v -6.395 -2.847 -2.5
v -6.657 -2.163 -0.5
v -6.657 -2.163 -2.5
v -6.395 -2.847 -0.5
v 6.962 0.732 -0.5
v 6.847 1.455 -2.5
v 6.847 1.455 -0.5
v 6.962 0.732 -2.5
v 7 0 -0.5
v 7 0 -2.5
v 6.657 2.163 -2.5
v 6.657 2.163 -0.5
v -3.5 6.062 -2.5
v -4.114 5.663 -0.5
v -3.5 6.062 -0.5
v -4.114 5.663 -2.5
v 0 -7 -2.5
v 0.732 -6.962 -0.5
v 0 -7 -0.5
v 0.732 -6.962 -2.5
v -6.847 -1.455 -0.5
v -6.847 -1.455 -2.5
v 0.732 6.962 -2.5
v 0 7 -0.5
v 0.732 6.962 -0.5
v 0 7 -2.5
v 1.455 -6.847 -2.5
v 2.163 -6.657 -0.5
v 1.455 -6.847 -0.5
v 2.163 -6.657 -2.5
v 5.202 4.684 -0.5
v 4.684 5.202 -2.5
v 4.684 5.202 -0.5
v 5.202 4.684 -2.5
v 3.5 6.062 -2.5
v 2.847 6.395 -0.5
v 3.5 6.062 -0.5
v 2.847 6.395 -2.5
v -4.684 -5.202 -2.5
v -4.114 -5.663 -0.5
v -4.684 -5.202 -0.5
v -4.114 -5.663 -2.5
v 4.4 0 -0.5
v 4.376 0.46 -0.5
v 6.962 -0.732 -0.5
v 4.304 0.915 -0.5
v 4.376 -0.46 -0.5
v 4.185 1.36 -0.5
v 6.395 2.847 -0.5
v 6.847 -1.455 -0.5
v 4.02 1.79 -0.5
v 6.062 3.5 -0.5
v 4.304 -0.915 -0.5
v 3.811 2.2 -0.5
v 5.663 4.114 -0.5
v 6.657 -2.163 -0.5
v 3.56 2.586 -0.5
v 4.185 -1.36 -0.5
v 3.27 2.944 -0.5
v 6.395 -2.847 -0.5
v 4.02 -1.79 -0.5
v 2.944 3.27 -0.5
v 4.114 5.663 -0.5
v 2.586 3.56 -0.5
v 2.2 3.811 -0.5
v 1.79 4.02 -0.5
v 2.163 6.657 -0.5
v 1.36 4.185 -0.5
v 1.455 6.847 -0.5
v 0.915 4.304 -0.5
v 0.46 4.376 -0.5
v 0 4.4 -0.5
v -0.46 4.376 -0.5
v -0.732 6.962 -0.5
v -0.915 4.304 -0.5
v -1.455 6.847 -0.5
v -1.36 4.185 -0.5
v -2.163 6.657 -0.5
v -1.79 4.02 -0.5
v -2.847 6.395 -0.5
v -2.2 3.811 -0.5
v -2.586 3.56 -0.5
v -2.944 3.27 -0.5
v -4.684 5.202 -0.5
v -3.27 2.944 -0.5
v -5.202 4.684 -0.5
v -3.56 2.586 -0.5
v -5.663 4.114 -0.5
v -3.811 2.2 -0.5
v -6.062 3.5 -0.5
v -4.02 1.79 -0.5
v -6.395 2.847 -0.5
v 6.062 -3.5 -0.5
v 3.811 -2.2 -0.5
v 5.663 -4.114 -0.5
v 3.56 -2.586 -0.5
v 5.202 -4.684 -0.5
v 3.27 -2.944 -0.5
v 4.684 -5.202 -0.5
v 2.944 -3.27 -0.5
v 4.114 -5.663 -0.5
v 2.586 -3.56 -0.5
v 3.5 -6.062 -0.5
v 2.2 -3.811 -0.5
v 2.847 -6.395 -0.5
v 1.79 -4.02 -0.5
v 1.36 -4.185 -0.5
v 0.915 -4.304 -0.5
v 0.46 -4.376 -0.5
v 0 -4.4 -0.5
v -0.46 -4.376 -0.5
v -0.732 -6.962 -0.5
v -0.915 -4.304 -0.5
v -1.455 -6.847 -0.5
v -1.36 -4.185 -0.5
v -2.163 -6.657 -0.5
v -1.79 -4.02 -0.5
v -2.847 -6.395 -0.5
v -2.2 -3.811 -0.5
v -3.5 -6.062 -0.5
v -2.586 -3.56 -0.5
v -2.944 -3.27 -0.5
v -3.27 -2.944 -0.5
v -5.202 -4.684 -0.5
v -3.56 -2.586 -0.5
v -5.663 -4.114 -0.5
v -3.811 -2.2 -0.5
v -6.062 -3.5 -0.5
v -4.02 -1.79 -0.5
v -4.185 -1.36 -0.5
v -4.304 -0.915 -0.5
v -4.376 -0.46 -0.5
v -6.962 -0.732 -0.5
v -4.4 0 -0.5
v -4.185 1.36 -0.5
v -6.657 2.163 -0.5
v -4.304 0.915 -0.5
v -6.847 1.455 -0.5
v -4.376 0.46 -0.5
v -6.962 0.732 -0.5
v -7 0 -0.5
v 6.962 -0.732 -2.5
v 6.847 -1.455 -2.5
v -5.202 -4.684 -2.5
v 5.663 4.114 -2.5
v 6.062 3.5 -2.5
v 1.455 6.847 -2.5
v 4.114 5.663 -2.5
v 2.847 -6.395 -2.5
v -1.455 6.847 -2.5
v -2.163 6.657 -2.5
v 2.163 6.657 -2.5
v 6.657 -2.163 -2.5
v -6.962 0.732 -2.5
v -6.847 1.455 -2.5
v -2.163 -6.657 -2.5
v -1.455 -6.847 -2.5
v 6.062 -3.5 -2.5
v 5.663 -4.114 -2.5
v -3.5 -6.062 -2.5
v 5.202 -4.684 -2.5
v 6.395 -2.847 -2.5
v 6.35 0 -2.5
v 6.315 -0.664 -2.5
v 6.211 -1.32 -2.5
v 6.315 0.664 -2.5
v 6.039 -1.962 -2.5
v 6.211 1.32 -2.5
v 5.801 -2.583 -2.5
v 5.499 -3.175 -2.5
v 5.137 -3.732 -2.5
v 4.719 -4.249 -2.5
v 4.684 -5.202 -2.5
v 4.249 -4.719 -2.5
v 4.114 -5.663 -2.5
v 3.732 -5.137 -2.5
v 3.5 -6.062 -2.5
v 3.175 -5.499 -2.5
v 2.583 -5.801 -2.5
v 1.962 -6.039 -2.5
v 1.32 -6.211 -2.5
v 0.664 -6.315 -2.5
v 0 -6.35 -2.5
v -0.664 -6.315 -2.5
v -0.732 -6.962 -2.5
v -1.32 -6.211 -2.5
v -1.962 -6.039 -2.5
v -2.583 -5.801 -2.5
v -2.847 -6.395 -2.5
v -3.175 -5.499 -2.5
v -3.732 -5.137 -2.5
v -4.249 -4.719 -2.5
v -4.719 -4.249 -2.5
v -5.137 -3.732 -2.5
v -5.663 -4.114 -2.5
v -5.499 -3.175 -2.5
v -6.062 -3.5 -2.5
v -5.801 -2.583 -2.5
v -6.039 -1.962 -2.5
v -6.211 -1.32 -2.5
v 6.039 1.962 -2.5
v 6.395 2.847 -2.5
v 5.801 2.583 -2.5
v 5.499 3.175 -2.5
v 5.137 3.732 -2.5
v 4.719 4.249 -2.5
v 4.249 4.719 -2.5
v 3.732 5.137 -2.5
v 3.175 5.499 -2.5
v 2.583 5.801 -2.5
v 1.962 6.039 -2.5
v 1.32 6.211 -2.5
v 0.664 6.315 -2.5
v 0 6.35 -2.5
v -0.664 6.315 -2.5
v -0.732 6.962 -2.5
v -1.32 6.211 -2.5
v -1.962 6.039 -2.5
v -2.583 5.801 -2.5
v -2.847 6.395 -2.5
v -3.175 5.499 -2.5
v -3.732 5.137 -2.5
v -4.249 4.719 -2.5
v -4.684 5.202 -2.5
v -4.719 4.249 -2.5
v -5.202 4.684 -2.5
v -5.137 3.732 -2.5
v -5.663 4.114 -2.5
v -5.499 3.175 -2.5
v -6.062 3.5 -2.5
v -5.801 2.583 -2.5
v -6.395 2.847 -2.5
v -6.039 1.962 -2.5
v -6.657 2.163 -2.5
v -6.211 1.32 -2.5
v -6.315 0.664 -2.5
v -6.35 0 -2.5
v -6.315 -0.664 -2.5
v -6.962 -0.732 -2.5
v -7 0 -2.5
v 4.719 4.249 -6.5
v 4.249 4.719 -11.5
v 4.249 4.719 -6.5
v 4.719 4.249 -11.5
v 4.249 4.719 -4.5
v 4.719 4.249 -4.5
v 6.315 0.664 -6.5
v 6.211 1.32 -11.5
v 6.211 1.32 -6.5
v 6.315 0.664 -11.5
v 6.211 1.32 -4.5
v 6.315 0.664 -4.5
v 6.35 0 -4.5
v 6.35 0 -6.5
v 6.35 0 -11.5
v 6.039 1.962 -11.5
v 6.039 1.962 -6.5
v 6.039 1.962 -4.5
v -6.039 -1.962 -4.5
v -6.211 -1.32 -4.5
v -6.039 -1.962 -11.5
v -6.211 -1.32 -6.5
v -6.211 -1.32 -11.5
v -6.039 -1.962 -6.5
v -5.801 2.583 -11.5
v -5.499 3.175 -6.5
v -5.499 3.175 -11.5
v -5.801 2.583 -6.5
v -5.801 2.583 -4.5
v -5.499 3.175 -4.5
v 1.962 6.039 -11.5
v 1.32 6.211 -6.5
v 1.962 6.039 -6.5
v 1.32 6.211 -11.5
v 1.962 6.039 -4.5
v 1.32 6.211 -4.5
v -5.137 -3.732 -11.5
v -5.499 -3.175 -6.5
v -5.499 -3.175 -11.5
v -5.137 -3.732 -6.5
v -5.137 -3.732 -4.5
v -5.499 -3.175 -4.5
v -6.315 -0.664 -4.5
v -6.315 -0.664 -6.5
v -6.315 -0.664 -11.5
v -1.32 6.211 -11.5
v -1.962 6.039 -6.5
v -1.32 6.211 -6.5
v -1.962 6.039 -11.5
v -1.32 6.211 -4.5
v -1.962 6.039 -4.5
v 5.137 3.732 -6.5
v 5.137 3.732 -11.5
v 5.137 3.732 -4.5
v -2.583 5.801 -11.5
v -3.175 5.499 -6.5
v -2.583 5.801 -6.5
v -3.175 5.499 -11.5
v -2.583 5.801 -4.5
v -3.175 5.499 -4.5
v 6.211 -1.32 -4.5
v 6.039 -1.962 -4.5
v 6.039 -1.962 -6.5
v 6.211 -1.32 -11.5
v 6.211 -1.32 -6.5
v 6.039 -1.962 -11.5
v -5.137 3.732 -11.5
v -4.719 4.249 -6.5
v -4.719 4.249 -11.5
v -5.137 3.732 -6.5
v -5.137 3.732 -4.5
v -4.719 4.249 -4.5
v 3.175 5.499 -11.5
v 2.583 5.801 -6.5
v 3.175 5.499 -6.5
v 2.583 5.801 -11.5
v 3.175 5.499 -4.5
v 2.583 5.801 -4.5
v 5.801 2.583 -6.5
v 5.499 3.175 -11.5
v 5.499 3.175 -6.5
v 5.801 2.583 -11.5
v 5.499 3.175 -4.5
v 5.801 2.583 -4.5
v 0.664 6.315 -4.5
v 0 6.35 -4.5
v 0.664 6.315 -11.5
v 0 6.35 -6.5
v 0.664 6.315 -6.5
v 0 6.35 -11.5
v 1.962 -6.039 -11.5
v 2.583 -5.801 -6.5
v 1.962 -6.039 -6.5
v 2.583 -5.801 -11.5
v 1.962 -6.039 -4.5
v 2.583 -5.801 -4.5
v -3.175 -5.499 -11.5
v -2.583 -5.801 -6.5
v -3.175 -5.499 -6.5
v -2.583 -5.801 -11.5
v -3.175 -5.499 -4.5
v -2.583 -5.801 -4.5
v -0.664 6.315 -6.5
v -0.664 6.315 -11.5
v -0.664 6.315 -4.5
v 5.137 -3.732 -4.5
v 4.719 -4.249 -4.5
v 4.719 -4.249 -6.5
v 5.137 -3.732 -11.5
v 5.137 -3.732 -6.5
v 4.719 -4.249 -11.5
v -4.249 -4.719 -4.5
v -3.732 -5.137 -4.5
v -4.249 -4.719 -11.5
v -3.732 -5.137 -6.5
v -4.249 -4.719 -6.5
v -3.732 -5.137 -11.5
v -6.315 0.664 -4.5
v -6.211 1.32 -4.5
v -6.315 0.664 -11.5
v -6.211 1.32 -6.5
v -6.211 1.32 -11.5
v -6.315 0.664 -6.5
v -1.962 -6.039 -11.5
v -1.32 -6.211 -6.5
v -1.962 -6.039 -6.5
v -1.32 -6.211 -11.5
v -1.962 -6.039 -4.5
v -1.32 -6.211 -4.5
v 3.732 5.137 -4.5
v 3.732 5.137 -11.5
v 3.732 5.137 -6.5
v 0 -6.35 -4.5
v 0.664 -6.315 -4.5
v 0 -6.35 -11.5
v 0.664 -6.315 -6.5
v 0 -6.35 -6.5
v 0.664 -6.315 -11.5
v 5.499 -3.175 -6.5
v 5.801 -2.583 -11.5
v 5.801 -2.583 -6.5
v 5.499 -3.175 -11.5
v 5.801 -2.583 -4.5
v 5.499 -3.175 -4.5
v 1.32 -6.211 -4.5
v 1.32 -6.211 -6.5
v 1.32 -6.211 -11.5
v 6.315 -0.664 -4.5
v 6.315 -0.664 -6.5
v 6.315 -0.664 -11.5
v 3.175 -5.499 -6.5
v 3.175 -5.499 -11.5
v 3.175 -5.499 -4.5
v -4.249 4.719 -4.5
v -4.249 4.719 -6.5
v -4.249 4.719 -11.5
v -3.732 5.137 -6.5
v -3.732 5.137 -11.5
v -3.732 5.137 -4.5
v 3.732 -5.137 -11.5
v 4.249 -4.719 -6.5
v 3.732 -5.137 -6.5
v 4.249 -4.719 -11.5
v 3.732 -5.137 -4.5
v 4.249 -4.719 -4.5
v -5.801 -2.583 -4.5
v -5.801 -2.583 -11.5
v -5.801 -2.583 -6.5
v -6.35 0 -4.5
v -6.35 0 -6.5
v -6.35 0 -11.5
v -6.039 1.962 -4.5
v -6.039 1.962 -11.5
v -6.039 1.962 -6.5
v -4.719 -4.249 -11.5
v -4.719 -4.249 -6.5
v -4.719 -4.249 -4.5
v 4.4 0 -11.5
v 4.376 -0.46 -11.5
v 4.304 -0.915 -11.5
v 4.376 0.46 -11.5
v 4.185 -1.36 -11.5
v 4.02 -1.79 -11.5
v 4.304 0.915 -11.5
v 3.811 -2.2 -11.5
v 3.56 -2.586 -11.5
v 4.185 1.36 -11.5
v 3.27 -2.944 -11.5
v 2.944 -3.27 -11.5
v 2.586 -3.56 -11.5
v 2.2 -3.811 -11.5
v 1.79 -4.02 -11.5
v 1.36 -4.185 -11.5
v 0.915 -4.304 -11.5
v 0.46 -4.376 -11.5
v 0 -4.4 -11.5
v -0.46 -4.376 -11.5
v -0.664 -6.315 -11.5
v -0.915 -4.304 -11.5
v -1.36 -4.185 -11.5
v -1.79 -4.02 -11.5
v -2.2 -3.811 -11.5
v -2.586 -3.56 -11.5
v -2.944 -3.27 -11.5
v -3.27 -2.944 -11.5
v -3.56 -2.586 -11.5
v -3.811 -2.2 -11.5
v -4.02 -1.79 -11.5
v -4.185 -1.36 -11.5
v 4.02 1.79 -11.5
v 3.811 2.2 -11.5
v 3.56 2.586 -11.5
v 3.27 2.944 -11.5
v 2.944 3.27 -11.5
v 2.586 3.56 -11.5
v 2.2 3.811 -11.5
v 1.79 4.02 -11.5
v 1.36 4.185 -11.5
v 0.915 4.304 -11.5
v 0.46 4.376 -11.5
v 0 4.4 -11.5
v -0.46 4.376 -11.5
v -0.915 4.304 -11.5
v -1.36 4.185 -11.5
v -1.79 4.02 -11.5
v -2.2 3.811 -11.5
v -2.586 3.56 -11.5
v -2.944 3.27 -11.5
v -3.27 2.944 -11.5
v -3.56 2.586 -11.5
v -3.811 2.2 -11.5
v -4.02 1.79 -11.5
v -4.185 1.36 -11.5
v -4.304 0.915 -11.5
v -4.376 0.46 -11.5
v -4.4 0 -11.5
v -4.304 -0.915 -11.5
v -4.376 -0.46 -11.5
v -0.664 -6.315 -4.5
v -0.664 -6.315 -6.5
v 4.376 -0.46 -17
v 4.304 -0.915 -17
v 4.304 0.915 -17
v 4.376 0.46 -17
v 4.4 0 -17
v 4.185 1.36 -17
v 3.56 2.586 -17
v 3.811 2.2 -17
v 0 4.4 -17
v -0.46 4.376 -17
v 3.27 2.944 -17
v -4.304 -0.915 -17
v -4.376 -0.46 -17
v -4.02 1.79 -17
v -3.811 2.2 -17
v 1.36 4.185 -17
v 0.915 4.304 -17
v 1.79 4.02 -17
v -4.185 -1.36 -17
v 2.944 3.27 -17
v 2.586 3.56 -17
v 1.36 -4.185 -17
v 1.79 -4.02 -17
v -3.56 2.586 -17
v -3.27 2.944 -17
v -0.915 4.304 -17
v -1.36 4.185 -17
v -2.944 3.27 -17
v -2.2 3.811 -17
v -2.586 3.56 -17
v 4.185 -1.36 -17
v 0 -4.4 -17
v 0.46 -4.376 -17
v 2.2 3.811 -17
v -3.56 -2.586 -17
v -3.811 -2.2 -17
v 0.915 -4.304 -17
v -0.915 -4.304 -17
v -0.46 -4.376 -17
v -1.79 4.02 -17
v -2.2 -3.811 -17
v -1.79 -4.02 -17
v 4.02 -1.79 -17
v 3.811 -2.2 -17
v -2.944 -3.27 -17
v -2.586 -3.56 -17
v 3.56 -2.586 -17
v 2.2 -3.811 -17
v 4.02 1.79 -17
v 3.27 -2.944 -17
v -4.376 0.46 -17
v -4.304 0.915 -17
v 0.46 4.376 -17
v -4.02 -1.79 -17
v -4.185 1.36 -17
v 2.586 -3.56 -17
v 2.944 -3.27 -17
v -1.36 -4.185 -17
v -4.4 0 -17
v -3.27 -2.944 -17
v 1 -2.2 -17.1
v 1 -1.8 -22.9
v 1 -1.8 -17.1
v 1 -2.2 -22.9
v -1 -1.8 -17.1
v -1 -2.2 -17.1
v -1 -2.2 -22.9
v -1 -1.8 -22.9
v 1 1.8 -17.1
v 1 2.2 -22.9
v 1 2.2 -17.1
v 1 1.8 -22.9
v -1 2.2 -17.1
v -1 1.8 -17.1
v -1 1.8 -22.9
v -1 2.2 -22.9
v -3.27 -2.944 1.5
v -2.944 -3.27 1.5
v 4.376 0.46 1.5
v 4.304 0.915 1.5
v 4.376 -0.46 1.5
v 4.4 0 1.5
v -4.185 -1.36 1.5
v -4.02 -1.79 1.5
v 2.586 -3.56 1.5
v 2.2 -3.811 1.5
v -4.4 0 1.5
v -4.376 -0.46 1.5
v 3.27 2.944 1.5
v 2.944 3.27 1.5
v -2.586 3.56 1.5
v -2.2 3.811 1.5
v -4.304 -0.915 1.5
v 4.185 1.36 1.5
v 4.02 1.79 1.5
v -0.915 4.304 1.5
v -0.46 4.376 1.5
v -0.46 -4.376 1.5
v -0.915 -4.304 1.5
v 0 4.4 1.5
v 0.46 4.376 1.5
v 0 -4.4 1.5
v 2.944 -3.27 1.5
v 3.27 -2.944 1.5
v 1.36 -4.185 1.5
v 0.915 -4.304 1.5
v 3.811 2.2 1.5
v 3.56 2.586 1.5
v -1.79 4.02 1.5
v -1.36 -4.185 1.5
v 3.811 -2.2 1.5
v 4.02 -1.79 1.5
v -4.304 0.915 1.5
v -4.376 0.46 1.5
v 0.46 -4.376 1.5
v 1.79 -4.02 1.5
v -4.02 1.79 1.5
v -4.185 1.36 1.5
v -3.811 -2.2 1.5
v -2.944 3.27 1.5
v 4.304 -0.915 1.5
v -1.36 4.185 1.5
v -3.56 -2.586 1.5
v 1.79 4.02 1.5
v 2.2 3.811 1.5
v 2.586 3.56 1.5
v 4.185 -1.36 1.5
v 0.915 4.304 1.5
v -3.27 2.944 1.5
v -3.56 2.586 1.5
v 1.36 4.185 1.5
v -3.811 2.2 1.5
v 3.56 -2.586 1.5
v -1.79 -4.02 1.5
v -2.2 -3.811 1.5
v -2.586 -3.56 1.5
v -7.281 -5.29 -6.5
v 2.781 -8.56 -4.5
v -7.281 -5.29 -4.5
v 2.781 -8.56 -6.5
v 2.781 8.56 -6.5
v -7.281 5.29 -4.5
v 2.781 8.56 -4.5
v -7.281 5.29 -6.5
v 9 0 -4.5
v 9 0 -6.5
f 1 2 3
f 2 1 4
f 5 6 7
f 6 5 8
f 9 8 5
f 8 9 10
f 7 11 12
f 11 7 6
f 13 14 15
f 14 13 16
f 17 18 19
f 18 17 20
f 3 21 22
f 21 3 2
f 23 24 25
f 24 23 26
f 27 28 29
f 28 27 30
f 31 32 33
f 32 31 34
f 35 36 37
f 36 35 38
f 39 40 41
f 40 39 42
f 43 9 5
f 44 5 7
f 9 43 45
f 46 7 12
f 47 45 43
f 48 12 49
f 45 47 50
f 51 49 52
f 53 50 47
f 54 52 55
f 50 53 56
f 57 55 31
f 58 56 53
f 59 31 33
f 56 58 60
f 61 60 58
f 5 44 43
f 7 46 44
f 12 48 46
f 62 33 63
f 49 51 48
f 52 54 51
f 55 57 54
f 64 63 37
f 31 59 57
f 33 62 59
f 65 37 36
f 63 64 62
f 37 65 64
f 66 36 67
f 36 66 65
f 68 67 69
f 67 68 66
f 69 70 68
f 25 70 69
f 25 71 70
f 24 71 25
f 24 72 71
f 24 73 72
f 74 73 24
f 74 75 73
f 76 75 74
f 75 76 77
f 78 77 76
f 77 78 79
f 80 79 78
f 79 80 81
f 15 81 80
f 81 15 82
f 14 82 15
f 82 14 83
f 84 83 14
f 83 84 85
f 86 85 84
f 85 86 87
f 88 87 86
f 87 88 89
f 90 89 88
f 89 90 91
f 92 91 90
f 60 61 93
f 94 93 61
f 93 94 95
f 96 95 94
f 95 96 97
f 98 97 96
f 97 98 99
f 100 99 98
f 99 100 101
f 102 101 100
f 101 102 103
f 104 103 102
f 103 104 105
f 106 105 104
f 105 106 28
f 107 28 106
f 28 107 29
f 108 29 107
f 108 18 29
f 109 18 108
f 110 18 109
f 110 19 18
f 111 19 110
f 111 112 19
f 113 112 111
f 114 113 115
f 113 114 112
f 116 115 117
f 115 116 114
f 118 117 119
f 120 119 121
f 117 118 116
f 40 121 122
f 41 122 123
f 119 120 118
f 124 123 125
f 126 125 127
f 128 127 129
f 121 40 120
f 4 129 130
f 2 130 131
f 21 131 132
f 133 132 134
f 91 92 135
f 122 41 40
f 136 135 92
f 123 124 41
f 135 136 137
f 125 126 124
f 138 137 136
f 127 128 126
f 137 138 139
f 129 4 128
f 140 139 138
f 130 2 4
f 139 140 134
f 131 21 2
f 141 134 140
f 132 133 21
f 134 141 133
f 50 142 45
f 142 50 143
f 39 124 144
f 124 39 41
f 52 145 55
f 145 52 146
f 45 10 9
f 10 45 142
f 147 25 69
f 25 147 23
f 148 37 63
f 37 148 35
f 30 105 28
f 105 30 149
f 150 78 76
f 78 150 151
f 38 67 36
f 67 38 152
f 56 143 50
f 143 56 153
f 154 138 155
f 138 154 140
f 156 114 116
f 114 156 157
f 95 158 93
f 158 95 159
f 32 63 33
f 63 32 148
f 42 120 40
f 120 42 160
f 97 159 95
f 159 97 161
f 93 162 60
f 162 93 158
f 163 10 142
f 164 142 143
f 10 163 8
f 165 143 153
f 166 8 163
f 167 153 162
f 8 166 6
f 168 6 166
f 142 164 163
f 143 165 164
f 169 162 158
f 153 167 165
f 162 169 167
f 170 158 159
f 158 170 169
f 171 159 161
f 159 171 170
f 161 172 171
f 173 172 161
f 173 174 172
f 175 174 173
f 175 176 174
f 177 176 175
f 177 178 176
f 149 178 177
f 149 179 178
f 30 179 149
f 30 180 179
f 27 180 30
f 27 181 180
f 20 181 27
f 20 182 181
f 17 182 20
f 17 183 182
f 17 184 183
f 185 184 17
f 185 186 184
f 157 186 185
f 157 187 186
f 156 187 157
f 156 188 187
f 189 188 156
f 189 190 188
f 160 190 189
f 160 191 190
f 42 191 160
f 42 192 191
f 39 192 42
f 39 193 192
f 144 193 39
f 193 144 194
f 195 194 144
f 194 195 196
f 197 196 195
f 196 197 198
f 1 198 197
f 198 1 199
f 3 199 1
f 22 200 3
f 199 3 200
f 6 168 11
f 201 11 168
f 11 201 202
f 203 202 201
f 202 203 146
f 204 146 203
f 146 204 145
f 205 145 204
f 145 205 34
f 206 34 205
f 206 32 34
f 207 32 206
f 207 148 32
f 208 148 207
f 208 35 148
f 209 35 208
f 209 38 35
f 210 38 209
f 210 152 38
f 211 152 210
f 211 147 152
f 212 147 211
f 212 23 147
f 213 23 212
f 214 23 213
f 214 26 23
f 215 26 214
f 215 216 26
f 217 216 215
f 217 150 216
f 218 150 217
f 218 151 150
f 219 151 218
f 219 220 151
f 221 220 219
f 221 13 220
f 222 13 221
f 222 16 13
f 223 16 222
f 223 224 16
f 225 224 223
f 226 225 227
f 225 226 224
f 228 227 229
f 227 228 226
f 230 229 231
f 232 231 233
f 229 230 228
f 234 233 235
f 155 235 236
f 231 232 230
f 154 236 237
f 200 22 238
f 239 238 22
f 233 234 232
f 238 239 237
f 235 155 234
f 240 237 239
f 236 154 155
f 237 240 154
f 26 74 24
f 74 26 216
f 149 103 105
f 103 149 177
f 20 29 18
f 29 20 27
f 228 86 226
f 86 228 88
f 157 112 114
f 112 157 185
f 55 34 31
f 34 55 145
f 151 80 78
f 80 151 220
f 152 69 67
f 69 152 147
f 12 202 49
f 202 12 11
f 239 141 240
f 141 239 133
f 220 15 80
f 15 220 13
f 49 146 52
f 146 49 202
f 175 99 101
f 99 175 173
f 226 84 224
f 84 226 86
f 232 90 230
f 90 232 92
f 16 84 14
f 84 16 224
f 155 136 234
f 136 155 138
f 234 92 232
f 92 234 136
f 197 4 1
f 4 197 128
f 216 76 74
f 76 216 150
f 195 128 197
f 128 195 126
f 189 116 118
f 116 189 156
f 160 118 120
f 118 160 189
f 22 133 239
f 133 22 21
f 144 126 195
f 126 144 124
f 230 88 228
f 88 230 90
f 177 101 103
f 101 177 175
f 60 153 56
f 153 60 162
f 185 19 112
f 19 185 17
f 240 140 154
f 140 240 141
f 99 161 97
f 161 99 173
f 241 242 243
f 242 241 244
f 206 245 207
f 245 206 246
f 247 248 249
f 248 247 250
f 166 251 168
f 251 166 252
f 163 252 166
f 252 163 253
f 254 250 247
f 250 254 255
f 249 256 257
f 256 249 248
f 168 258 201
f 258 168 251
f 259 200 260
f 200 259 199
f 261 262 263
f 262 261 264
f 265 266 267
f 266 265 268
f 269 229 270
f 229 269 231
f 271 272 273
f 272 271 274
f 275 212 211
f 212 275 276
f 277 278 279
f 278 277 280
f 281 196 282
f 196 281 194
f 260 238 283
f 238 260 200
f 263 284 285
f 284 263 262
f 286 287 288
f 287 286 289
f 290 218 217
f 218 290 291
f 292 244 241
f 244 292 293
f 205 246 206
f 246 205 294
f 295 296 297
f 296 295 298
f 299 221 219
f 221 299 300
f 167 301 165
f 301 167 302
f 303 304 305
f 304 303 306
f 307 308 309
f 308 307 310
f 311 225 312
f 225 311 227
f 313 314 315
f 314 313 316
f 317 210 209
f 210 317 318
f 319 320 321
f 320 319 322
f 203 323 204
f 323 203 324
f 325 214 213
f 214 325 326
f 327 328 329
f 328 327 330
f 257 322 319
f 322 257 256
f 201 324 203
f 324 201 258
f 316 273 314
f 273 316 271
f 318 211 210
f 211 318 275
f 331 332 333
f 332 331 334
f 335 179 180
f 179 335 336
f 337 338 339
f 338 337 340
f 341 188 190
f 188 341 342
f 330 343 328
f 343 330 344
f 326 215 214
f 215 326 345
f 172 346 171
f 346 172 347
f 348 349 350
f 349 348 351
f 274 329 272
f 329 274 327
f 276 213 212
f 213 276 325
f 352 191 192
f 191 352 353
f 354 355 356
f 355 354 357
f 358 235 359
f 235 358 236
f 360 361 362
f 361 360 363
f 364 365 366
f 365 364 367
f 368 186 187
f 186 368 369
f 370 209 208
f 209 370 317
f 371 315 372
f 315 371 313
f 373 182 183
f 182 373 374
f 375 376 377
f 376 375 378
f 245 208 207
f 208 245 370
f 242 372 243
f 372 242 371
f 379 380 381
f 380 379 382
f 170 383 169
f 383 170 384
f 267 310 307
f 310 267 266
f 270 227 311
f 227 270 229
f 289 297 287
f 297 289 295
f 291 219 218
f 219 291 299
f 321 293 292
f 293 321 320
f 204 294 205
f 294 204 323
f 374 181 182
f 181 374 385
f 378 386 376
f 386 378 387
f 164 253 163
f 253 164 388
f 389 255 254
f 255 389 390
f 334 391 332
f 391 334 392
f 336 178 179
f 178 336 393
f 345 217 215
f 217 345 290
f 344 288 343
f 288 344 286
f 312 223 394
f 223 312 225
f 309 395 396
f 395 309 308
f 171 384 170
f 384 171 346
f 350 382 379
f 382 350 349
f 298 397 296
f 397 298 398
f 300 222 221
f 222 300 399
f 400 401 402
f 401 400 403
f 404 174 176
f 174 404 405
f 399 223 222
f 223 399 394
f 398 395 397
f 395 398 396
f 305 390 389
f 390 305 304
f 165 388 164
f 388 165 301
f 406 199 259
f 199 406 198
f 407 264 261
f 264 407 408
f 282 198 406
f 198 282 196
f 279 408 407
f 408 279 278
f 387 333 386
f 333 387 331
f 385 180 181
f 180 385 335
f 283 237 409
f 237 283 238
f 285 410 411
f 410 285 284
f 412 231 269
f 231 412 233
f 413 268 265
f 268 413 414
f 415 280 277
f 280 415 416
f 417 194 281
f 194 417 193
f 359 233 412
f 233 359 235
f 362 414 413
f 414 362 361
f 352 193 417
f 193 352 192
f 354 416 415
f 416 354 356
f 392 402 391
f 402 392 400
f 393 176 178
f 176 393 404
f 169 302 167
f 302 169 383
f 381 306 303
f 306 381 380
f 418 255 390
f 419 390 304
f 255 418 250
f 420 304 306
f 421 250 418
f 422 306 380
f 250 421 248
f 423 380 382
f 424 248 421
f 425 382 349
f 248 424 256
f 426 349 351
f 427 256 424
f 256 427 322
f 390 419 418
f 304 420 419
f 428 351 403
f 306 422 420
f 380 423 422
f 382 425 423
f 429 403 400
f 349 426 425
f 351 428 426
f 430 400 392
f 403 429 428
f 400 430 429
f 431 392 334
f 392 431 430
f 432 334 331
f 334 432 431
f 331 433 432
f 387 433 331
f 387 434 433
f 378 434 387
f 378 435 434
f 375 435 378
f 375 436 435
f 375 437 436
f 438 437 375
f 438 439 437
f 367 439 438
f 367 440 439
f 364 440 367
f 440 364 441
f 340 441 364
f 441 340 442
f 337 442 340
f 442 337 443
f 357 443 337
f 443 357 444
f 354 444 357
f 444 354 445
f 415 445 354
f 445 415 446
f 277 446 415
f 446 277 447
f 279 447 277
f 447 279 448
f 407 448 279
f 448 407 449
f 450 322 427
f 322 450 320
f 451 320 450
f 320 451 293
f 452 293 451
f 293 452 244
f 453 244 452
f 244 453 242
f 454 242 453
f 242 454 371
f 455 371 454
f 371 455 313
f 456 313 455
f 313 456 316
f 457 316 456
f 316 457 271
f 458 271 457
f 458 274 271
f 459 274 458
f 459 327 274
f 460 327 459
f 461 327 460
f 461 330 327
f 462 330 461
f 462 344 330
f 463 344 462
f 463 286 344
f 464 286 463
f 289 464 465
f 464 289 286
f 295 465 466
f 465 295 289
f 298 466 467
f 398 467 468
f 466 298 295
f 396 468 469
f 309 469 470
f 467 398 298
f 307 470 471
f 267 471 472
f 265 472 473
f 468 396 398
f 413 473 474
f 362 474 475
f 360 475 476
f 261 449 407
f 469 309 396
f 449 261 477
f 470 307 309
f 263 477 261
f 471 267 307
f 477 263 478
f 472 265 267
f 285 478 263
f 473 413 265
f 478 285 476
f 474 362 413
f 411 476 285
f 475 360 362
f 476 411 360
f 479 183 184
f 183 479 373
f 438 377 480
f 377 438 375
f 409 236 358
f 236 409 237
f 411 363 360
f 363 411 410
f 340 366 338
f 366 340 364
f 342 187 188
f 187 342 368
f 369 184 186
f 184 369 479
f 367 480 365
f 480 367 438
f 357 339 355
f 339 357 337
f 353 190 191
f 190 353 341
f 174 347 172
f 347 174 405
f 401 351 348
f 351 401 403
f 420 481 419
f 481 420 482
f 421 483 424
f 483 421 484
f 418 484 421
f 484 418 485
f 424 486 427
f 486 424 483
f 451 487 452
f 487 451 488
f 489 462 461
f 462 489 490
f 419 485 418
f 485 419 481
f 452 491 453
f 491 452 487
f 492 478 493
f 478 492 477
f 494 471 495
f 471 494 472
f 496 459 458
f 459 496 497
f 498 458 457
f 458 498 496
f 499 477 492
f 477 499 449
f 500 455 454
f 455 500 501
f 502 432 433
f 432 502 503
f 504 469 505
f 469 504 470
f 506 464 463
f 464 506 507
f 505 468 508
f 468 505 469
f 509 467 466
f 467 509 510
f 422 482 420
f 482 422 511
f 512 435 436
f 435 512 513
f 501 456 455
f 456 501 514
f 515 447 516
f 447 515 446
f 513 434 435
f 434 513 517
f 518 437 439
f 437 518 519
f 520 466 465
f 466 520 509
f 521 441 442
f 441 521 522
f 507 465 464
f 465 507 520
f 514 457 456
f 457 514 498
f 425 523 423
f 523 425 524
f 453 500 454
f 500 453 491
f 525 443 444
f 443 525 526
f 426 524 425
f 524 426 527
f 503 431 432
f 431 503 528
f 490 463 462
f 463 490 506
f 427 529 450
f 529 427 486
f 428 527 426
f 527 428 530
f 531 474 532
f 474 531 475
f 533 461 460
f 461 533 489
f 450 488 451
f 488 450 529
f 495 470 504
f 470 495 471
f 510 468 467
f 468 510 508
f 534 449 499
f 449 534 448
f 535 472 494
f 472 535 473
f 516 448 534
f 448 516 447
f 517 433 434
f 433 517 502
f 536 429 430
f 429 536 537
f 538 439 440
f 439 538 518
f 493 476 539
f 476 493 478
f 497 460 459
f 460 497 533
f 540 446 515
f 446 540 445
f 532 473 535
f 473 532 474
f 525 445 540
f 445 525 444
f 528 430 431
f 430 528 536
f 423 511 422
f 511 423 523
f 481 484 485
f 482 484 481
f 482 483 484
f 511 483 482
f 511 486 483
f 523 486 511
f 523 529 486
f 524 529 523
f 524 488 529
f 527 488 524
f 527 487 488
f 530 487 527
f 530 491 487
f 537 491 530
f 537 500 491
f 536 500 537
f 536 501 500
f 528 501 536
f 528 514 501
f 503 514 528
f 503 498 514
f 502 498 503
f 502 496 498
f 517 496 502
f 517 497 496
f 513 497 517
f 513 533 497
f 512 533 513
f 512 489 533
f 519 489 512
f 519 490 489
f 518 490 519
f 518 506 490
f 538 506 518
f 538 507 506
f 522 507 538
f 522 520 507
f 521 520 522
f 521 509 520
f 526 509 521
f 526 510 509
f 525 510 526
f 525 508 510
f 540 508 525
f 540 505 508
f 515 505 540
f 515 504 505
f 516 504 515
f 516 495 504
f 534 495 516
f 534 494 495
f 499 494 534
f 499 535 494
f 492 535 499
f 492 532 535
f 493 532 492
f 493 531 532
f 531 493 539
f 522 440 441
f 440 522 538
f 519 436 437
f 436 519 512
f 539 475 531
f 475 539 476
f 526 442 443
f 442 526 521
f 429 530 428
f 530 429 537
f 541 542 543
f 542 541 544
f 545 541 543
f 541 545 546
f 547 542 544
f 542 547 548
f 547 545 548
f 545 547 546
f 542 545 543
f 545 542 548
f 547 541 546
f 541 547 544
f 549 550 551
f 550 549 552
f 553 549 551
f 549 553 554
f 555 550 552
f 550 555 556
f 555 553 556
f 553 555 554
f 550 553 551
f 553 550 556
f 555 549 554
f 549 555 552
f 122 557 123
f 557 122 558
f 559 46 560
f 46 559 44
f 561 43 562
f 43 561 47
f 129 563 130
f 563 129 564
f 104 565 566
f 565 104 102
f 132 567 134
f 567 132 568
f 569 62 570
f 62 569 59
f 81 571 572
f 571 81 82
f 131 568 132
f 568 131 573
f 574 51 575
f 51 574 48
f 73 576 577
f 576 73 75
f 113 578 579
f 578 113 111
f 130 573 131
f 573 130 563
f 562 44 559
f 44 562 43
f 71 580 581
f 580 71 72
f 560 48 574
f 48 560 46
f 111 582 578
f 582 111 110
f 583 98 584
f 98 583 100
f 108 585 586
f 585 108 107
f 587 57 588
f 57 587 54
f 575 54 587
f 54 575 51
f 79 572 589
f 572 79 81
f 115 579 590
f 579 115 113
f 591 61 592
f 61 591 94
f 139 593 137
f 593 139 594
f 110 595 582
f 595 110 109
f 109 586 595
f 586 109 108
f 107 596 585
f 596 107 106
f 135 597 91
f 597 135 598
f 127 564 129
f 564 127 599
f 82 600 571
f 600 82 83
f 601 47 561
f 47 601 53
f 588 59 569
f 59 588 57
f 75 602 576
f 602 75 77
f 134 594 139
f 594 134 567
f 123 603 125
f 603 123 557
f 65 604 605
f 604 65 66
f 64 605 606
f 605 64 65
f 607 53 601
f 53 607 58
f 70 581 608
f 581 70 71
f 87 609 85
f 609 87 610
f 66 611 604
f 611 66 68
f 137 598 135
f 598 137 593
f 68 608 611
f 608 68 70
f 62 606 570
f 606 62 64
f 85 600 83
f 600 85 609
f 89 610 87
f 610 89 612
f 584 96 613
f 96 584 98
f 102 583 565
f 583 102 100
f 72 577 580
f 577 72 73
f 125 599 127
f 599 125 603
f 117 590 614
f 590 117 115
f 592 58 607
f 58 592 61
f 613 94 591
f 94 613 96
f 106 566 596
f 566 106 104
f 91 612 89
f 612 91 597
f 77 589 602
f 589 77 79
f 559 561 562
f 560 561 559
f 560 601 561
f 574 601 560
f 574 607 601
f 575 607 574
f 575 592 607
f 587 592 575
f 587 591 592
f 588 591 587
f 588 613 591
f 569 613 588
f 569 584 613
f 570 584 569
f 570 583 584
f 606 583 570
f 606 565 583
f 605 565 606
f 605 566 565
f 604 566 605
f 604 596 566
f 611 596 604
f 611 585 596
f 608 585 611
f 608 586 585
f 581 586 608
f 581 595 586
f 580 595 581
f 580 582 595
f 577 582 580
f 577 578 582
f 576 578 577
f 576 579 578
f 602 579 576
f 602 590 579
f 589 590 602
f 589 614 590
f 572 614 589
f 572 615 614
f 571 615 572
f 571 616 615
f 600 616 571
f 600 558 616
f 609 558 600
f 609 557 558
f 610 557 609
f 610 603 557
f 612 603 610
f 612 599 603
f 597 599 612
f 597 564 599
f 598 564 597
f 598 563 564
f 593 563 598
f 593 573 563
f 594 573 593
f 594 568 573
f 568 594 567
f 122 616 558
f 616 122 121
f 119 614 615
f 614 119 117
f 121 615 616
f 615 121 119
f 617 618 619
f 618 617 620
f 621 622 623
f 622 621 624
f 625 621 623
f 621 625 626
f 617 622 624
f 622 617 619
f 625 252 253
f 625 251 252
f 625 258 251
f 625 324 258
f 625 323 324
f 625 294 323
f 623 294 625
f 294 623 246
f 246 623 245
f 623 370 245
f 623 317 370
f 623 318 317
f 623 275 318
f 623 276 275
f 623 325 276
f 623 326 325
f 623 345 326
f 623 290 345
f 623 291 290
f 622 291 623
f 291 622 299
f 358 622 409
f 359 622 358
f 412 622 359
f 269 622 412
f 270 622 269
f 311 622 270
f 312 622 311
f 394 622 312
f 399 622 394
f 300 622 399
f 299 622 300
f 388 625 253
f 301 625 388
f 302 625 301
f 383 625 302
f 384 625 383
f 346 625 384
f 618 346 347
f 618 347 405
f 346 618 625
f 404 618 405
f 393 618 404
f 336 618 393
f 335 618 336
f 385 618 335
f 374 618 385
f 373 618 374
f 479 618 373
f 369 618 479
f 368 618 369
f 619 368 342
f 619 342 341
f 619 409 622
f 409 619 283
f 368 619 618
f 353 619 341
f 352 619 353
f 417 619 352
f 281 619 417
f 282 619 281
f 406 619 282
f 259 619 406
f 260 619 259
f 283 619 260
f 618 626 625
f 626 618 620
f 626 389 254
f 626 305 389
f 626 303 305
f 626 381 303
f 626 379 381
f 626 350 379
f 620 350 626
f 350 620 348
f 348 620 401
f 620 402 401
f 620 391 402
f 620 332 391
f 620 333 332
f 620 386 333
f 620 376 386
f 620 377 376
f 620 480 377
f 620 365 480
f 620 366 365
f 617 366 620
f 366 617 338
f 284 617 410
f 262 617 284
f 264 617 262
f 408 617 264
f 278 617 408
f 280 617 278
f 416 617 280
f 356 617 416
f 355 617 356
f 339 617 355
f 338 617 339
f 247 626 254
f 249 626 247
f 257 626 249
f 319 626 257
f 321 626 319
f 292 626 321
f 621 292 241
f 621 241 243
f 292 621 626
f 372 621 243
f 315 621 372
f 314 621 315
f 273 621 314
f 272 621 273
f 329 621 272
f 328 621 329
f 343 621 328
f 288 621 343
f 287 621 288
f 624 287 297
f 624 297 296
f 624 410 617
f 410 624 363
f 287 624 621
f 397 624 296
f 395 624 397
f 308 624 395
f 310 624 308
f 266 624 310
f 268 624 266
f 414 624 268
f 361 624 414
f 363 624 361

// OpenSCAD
$fn=60;

color("red") cylinder(d=8.8,h=3,center=true);
color("#808080") {
    translate([0,0,-1.5]) cylinder(d=14, h=2, center=true);
    translate([0,0,-11.5]) cylinder(d=12.7,h=9);
    translate([0,0,-17]) cylinder(d=8.8,h=6);
}



color("lightgray") translate([0,0,-6.5]) cylinder(d=18,h=2, $fn=5);

color("lightgray") {
    translate([0,-2,-20])cube([2,0.4,5.80], center=true);
    translate([0,2,-20])cube([2,0.4,5.80], center=true);
}
